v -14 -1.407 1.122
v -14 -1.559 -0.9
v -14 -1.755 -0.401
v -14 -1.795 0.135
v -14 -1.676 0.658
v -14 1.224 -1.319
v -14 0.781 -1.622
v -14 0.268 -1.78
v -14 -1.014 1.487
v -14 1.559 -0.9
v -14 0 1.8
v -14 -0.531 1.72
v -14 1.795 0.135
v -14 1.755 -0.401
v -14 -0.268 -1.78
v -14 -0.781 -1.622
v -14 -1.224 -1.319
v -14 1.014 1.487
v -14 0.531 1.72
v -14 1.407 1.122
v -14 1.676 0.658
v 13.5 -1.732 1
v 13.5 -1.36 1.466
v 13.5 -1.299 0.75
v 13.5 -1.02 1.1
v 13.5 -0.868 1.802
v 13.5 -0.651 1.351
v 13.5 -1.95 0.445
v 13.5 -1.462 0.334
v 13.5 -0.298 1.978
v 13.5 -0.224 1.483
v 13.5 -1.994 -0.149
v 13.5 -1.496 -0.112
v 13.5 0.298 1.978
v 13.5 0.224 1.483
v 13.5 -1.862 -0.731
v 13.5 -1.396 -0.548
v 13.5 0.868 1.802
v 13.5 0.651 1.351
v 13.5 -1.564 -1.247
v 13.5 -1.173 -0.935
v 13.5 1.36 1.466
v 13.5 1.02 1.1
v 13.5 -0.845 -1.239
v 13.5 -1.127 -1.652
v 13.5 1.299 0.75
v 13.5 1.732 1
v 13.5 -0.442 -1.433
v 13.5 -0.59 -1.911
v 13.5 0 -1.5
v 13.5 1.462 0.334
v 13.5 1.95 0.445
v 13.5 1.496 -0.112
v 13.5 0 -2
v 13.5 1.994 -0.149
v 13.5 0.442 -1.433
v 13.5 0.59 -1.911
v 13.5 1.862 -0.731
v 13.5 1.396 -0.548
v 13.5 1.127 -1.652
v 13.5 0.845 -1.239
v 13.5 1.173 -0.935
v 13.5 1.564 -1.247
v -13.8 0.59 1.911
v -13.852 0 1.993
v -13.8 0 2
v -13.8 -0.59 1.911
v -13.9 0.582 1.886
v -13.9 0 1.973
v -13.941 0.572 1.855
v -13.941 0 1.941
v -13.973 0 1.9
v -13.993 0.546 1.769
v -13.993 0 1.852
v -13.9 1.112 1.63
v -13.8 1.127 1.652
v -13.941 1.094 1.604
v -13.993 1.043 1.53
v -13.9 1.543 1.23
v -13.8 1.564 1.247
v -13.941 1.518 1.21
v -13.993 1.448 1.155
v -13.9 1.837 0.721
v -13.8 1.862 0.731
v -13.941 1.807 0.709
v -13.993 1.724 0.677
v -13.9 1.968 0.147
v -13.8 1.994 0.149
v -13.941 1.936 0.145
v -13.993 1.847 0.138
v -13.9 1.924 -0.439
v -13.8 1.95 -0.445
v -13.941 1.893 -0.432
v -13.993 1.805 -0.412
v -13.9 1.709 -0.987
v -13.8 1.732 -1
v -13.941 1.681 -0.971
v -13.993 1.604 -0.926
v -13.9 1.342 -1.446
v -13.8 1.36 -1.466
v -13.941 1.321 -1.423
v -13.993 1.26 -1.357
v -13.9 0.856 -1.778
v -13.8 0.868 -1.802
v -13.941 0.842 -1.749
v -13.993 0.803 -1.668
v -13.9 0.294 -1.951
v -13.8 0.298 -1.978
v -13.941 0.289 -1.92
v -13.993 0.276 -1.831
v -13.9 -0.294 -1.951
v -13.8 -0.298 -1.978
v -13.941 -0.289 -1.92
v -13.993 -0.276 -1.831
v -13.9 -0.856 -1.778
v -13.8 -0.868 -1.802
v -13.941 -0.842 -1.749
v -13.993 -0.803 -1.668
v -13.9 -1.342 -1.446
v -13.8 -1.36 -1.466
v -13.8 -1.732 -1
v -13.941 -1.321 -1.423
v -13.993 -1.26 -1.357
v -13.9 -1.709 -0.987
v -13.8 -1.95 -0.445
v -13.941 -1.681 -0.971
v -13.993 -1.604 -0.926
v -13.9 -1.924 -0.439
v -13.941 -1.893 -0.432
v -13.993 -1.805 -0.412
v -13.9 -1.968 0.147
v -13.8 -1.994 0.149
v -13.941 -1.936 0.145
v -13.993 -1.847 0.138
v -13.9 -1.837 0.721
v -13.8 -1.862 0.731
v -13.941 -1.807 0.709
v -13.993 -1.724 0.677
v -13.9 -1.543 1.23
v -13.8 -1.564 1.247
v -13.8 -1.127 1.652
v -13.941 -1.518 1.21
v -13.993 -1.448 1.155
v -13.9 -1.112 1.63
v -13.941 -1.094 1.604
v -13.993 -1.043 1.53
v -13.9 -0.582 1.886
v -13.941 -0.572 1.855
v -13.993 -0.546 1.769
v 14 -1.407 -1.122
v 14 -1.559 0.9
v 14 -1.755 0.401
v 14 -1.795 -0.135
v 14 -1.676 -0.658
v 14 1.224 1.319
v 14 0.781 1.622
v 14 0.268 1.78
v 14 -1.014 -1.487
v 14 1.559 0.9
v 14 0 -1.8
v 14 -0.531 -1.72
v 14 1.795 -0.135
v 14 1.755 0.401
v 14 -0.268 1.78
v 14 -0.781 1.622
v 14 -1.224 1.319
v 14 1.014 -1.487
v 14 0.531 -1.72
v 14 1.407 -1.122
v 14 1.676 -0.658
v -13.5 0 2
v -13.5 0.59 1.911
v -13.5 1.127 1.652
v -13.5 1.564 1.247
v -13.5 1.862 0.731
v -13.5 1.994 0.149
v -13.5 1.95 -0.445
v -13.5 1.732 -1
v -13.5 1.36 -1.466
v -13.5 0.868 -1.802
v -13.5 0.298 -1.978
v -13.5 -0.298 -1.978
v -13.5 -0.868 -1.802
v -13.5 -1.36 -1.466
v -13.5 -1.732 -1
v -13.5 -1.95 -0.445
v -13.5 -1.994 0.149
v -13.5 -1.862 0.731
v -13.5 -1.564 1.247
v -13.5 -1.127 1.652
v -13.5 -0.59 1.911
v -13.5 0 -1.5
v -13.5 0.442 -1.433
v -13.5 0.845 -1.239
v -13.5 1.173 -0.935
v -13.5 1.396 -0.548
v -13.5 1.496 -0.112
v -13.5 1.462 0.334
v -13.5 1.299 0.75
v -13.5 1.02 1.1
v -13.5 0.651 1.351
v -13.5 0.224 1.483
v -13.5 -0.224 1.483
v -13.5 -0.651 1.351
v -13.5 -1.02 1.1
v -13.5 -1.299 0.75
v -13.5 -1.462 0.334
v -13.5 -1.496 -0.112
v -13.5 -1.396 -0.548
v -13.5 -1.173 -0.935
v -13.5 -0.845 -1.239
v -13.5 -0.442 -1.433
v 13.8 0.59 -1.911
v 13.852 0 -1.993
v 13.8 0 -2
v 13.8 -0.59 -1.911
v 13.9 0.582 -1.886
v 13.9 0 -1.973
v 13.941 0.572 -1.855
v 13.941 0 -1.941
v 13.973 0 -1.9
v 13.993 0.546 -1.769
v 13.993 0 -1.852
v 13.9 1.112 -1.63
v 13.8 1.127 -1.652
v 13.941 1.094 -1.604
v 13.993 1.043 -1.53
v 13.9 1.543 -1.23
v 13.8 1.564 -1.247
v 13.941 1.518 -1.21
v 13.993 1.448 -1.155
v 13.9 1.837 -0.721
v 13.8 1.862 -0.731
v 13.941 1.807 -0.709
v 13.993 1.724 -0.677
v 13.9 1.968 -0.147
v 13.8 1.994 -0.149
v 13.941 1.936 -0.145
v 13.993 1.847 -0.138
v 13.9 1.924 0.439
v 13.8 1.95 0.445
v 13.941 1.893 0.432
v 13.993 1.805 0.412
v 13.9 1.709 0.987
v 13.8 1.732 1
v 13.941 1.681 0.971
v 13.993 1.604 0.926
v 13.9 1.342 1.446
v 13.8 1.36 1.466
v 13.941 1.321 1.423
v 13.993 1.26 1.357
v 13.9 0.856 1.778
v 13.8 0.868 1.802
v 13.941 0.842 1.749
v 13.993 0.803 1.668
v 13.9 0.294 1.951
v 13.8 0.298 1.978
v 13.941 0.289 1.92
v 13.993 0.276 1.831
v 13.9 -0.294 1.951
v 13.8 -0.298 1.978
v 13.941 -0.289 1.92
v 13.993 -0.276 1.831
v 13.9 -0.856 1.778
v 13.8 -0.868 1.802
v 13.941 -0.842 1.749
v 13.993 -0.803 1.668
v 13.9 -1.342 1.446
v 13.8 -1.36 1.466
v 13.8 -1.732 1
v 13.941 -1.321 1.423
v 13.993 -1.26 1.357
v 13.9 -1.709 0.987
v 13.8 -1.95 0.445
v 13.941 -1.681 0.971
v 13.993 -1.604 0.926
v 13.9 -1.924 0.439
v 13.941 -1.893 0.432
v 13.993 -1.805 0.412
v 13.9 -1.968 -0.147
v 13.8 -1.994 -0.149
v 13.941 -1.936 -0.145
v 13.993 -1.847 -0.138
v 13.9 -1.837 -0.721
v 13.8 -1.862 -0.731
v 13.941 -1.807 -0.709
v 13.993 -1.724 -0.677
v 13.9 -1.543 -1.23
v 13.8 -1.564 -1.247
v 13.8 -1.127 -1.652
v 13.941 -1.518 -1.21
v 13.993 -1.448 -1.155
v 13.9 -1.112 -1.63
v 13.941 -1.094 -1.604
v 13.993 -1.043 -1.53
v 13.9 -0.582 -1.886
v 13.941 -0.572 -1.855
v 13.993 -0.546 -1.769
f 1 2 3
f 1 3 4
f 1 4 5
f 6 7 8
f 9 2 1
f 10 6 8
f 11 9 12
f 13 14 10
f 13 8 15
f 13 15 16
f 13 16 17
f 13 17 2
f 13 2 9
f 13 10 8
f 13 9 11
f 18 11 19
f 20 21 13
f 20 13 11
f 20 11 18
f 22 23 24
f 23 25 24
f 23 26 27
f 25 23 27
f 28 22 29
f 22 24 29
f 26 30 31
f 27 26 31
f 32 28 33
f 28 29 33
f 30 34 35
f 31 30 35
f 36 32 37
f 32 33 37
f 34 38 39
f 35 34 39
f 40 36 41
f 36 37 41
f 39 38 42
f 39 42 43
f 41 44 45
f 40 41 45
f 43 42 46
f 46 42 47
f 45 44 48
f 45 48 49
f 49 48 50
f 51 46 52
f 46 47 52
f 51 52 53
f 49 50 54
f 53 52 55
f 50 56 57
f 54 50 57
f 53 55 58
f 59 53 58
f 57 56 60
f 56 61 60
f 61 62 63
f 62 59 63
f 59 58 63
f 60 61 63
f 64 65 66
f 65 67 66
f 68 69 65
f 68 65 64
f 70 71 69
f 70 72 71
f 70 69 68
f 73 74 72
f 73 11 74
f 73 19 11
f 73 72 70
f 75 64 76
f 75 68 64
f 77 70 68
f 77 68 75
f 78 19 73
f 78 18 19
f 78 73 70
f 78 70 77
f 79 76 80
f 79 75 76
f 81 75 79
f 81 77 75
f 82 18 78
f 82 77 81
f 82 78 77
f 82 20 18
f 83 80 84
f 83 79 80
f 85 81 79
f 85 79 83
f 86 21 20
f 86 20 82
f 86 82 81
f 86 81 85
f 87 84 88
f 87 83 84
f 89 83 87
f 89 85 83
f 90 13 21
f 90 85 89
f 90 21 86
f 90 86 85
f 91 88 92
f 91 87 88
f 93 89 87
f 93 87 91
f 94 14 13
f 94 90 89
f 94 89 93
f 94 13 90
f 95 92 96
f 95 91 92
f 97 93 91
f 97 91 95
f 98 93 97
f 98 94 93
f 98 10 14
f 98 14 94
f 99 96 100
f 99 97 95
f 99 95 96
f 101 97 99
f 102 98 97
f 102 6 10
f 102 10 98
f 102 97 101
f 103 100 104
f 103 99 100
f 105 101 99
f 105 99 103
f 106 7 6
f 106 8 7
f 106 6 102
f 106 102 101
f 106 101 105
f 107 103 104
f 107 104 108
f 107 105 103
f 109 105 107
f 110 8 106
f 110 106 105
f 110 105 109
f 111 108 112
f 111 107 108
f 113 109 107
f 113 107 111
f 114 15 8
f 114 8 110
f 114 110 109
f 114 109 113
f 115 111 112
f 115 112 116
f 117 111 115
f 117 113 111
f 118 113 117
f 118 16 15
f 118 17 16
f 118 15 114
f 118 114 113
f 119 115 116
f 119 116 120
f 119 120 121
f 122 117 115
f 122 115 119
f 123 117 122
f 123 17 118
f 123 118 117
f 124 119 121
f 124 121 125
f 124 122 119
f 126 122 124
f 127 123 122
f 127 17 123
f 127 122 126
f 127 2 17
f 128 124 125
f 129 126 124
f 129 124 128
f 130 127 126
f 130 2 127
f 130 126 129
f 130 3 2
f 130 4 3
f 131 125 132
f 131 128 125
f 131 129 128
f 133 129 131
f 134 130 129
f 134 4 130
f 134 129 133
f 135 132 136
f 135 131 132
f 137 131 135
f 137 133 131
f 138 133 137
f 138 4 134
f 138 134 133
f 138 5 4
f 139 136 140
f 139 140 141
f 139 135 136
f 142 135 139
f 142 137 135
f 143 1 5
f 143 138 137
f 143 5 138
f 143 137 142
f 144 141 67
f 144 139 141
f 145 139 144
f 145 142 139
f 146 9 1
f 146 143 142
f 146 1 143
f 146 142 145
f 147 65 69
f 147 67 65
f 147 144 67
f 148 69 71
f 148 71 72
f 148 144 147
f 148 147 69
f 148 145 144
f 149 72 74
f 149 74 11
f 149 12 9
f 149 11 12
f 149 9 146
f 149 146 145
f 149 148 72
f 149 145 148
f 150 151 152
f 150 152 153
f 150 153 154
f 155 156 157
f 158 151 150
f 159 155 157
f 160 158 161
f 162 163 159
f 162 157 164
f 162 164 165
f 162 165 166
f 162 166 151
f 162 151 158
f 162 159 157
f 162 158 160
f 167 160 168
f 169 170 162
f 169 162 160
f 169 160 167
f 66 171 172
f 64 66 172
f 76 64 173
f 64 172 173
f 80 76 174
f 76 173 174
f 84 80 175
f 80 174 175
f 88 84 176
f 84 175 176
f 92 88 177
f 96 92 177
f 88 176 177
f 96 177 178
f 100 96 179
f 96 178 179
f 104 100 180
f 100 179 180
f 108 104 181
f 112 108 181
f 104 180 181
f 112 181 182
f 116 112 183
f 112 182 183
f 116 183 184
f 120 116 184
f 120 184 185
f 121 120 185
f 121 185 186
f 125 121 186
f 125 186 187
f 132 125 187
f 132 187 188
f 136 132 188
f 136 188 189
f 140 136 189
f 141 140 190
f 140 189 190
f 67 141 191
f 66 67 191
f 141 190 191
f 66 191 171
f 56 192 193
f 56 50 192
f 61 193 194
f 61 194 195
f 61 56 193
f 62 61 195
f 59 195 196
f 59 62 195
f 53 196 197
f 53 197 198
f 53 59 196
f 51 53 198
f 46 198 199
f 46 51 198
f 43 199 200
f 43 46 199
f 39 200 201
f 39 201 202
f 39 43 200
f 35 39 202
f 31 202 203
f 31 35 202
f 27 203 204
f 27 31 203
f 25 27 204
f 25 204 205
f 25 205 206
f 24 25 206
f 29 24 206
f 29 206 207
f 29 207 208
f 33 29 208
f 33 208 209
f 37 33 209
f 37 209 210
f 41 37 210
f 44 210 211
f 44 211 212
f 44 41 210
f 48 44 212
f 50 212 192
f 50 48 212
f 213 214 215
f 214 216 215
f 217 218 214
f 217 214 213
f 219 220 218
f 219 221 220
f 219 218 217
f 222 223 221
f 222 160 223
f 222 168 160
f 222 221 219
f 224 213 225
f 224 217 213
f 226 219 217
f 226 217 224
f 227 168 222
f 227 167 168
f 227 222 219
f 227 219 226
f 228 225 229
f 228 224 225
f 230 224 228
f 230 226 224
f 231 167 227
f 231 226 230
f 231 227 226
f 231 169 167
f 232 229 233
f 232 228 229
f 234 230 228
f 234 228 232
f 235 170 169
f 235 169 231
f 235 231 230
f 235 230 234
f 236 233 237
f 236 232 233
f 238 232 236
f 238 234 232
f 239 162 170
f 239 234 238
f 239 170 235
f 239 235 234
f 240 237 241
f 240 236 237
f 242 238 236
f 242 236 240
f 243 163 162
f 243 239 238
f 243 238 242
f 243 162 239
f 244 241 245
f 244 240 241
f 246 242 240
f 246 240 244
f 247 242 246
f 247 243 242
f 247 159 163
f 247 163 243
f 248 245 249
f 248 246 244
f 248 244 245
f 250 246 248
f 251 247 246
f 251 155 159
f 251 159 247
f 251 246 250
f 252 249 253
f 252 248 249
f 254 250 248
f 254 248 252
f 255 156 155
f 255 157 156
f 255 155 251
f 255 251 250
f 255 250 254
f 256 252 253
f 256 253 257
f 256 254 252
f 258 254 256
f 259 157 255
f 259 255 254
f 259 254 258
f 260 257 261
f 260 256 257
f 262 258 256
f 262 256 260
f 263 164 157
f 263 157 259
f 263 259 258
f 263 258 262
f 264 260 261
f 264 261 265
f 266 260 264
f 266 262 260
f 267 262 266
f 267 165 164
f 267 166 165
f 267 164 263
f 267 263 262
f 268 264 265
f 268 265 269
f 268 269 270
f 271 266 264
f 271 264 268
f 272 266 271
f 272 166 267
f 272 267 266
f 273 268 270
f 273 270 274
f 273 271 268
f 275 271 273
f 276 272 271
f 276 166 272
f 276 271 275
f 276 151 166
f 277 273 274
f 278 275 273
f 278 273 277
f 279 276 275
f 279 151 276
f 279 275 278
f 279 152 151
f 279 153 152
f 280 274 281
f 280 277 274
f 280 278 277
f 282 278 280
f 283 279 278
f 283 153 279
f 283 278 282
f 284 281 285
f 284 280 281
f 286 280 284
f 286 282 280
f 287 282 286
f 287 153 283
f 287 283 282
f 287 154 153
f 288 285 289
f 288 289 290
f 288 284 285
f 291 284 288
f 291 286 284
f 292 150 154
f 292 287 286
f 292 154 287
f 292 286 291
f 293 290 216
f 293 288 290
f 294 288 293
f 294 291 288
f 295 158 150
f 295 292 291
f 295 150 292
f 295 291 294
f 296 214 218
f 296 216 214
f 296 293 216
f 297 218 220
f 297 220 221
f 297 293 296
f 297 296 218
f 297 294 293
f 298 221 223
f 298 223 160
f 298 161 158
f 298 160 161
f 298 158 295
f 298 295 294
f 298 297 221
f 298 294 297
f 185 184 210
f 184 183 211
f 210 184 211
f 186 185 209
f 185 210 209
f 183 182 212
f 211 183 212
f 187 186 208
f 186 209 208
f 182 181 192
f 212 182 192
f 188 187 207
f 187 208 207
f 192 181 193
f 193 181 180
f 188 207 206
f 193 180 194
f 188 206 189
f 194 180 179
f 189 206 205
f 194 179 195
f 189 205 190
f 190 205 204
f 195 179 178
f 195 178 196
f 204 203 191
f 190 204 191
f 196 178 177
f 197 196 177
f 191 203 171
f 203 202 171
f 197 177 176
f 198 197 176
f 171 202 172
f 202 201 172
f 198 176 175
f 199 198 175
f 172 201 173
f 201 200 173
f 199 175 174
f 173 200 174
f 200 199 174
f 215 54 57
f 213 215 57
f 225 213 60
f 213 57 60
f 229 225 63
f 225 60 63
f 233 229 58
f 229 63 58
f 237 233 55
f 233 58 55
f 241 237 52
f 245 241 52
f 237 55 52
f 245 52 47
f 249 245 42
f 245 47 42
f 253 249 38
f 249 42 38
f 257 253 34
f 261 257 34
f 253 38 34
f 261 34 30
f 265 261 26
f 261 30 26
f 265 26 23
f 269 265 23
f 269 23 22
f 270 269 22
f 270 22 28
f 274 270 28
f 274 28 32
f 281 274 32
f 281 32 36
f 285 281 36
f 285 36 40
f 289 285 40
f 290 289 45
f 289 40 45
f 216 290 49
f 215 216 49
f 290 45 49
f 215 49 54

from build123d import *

# Parameters (mm, degrees)
SKETCH1_R           = 1.5
BOSS_EXTRUDE1_DEPTH = 13.5
SKETCH2_R           = 2
BOSS_EXTRUDE2_DEPTH = 0.5
SKETCH3_R           = 2
BOSS_EXTRUDE3_DEPTH = 0.5
FILLET1_R           = 0.2


with BuildPart() as part:
    # Sketch1 → Boss-Extrude1 (new body, symmetric)
    with BuildSketch(Plane(origin=(0, 0, 0), x_dir=(0, 0, -1), z_dir=(1, 0, 0))):
        Circle(SKETCH1_R)
    extrude(amount=BOSS_EXTRUDE1_DEPTH, both=True)

    # Sketch2 → Boss-Extrude2 (add)
    with BuildSketch(Plane(origin=(13.5, 0, 0), x_dir=(0, 0, -1), z_dir=(1, 0, 0))):
        Circle(SKETCH2_R)
    extrude(amount=BOSS_EXTRUDE2_DEPTH)

    # Sketch3 → Boss-Extrude3 (add)
    with BuildSketch(Plane.ZY.offset(13.5)):
        Circle(SKETCH3_R)
    extrude(amount=BOSS_EXTRUDE3_DEPTH)

    # Fillet1
    fillet1_edges = [part.edges().sort_by_distance(p)[0] for p in [
        (-14, 0, -2),
        (14, 0, 2),
    ]]
    fillet(fillet1_edges, radius=FILLET1_R)


solid = part.part
